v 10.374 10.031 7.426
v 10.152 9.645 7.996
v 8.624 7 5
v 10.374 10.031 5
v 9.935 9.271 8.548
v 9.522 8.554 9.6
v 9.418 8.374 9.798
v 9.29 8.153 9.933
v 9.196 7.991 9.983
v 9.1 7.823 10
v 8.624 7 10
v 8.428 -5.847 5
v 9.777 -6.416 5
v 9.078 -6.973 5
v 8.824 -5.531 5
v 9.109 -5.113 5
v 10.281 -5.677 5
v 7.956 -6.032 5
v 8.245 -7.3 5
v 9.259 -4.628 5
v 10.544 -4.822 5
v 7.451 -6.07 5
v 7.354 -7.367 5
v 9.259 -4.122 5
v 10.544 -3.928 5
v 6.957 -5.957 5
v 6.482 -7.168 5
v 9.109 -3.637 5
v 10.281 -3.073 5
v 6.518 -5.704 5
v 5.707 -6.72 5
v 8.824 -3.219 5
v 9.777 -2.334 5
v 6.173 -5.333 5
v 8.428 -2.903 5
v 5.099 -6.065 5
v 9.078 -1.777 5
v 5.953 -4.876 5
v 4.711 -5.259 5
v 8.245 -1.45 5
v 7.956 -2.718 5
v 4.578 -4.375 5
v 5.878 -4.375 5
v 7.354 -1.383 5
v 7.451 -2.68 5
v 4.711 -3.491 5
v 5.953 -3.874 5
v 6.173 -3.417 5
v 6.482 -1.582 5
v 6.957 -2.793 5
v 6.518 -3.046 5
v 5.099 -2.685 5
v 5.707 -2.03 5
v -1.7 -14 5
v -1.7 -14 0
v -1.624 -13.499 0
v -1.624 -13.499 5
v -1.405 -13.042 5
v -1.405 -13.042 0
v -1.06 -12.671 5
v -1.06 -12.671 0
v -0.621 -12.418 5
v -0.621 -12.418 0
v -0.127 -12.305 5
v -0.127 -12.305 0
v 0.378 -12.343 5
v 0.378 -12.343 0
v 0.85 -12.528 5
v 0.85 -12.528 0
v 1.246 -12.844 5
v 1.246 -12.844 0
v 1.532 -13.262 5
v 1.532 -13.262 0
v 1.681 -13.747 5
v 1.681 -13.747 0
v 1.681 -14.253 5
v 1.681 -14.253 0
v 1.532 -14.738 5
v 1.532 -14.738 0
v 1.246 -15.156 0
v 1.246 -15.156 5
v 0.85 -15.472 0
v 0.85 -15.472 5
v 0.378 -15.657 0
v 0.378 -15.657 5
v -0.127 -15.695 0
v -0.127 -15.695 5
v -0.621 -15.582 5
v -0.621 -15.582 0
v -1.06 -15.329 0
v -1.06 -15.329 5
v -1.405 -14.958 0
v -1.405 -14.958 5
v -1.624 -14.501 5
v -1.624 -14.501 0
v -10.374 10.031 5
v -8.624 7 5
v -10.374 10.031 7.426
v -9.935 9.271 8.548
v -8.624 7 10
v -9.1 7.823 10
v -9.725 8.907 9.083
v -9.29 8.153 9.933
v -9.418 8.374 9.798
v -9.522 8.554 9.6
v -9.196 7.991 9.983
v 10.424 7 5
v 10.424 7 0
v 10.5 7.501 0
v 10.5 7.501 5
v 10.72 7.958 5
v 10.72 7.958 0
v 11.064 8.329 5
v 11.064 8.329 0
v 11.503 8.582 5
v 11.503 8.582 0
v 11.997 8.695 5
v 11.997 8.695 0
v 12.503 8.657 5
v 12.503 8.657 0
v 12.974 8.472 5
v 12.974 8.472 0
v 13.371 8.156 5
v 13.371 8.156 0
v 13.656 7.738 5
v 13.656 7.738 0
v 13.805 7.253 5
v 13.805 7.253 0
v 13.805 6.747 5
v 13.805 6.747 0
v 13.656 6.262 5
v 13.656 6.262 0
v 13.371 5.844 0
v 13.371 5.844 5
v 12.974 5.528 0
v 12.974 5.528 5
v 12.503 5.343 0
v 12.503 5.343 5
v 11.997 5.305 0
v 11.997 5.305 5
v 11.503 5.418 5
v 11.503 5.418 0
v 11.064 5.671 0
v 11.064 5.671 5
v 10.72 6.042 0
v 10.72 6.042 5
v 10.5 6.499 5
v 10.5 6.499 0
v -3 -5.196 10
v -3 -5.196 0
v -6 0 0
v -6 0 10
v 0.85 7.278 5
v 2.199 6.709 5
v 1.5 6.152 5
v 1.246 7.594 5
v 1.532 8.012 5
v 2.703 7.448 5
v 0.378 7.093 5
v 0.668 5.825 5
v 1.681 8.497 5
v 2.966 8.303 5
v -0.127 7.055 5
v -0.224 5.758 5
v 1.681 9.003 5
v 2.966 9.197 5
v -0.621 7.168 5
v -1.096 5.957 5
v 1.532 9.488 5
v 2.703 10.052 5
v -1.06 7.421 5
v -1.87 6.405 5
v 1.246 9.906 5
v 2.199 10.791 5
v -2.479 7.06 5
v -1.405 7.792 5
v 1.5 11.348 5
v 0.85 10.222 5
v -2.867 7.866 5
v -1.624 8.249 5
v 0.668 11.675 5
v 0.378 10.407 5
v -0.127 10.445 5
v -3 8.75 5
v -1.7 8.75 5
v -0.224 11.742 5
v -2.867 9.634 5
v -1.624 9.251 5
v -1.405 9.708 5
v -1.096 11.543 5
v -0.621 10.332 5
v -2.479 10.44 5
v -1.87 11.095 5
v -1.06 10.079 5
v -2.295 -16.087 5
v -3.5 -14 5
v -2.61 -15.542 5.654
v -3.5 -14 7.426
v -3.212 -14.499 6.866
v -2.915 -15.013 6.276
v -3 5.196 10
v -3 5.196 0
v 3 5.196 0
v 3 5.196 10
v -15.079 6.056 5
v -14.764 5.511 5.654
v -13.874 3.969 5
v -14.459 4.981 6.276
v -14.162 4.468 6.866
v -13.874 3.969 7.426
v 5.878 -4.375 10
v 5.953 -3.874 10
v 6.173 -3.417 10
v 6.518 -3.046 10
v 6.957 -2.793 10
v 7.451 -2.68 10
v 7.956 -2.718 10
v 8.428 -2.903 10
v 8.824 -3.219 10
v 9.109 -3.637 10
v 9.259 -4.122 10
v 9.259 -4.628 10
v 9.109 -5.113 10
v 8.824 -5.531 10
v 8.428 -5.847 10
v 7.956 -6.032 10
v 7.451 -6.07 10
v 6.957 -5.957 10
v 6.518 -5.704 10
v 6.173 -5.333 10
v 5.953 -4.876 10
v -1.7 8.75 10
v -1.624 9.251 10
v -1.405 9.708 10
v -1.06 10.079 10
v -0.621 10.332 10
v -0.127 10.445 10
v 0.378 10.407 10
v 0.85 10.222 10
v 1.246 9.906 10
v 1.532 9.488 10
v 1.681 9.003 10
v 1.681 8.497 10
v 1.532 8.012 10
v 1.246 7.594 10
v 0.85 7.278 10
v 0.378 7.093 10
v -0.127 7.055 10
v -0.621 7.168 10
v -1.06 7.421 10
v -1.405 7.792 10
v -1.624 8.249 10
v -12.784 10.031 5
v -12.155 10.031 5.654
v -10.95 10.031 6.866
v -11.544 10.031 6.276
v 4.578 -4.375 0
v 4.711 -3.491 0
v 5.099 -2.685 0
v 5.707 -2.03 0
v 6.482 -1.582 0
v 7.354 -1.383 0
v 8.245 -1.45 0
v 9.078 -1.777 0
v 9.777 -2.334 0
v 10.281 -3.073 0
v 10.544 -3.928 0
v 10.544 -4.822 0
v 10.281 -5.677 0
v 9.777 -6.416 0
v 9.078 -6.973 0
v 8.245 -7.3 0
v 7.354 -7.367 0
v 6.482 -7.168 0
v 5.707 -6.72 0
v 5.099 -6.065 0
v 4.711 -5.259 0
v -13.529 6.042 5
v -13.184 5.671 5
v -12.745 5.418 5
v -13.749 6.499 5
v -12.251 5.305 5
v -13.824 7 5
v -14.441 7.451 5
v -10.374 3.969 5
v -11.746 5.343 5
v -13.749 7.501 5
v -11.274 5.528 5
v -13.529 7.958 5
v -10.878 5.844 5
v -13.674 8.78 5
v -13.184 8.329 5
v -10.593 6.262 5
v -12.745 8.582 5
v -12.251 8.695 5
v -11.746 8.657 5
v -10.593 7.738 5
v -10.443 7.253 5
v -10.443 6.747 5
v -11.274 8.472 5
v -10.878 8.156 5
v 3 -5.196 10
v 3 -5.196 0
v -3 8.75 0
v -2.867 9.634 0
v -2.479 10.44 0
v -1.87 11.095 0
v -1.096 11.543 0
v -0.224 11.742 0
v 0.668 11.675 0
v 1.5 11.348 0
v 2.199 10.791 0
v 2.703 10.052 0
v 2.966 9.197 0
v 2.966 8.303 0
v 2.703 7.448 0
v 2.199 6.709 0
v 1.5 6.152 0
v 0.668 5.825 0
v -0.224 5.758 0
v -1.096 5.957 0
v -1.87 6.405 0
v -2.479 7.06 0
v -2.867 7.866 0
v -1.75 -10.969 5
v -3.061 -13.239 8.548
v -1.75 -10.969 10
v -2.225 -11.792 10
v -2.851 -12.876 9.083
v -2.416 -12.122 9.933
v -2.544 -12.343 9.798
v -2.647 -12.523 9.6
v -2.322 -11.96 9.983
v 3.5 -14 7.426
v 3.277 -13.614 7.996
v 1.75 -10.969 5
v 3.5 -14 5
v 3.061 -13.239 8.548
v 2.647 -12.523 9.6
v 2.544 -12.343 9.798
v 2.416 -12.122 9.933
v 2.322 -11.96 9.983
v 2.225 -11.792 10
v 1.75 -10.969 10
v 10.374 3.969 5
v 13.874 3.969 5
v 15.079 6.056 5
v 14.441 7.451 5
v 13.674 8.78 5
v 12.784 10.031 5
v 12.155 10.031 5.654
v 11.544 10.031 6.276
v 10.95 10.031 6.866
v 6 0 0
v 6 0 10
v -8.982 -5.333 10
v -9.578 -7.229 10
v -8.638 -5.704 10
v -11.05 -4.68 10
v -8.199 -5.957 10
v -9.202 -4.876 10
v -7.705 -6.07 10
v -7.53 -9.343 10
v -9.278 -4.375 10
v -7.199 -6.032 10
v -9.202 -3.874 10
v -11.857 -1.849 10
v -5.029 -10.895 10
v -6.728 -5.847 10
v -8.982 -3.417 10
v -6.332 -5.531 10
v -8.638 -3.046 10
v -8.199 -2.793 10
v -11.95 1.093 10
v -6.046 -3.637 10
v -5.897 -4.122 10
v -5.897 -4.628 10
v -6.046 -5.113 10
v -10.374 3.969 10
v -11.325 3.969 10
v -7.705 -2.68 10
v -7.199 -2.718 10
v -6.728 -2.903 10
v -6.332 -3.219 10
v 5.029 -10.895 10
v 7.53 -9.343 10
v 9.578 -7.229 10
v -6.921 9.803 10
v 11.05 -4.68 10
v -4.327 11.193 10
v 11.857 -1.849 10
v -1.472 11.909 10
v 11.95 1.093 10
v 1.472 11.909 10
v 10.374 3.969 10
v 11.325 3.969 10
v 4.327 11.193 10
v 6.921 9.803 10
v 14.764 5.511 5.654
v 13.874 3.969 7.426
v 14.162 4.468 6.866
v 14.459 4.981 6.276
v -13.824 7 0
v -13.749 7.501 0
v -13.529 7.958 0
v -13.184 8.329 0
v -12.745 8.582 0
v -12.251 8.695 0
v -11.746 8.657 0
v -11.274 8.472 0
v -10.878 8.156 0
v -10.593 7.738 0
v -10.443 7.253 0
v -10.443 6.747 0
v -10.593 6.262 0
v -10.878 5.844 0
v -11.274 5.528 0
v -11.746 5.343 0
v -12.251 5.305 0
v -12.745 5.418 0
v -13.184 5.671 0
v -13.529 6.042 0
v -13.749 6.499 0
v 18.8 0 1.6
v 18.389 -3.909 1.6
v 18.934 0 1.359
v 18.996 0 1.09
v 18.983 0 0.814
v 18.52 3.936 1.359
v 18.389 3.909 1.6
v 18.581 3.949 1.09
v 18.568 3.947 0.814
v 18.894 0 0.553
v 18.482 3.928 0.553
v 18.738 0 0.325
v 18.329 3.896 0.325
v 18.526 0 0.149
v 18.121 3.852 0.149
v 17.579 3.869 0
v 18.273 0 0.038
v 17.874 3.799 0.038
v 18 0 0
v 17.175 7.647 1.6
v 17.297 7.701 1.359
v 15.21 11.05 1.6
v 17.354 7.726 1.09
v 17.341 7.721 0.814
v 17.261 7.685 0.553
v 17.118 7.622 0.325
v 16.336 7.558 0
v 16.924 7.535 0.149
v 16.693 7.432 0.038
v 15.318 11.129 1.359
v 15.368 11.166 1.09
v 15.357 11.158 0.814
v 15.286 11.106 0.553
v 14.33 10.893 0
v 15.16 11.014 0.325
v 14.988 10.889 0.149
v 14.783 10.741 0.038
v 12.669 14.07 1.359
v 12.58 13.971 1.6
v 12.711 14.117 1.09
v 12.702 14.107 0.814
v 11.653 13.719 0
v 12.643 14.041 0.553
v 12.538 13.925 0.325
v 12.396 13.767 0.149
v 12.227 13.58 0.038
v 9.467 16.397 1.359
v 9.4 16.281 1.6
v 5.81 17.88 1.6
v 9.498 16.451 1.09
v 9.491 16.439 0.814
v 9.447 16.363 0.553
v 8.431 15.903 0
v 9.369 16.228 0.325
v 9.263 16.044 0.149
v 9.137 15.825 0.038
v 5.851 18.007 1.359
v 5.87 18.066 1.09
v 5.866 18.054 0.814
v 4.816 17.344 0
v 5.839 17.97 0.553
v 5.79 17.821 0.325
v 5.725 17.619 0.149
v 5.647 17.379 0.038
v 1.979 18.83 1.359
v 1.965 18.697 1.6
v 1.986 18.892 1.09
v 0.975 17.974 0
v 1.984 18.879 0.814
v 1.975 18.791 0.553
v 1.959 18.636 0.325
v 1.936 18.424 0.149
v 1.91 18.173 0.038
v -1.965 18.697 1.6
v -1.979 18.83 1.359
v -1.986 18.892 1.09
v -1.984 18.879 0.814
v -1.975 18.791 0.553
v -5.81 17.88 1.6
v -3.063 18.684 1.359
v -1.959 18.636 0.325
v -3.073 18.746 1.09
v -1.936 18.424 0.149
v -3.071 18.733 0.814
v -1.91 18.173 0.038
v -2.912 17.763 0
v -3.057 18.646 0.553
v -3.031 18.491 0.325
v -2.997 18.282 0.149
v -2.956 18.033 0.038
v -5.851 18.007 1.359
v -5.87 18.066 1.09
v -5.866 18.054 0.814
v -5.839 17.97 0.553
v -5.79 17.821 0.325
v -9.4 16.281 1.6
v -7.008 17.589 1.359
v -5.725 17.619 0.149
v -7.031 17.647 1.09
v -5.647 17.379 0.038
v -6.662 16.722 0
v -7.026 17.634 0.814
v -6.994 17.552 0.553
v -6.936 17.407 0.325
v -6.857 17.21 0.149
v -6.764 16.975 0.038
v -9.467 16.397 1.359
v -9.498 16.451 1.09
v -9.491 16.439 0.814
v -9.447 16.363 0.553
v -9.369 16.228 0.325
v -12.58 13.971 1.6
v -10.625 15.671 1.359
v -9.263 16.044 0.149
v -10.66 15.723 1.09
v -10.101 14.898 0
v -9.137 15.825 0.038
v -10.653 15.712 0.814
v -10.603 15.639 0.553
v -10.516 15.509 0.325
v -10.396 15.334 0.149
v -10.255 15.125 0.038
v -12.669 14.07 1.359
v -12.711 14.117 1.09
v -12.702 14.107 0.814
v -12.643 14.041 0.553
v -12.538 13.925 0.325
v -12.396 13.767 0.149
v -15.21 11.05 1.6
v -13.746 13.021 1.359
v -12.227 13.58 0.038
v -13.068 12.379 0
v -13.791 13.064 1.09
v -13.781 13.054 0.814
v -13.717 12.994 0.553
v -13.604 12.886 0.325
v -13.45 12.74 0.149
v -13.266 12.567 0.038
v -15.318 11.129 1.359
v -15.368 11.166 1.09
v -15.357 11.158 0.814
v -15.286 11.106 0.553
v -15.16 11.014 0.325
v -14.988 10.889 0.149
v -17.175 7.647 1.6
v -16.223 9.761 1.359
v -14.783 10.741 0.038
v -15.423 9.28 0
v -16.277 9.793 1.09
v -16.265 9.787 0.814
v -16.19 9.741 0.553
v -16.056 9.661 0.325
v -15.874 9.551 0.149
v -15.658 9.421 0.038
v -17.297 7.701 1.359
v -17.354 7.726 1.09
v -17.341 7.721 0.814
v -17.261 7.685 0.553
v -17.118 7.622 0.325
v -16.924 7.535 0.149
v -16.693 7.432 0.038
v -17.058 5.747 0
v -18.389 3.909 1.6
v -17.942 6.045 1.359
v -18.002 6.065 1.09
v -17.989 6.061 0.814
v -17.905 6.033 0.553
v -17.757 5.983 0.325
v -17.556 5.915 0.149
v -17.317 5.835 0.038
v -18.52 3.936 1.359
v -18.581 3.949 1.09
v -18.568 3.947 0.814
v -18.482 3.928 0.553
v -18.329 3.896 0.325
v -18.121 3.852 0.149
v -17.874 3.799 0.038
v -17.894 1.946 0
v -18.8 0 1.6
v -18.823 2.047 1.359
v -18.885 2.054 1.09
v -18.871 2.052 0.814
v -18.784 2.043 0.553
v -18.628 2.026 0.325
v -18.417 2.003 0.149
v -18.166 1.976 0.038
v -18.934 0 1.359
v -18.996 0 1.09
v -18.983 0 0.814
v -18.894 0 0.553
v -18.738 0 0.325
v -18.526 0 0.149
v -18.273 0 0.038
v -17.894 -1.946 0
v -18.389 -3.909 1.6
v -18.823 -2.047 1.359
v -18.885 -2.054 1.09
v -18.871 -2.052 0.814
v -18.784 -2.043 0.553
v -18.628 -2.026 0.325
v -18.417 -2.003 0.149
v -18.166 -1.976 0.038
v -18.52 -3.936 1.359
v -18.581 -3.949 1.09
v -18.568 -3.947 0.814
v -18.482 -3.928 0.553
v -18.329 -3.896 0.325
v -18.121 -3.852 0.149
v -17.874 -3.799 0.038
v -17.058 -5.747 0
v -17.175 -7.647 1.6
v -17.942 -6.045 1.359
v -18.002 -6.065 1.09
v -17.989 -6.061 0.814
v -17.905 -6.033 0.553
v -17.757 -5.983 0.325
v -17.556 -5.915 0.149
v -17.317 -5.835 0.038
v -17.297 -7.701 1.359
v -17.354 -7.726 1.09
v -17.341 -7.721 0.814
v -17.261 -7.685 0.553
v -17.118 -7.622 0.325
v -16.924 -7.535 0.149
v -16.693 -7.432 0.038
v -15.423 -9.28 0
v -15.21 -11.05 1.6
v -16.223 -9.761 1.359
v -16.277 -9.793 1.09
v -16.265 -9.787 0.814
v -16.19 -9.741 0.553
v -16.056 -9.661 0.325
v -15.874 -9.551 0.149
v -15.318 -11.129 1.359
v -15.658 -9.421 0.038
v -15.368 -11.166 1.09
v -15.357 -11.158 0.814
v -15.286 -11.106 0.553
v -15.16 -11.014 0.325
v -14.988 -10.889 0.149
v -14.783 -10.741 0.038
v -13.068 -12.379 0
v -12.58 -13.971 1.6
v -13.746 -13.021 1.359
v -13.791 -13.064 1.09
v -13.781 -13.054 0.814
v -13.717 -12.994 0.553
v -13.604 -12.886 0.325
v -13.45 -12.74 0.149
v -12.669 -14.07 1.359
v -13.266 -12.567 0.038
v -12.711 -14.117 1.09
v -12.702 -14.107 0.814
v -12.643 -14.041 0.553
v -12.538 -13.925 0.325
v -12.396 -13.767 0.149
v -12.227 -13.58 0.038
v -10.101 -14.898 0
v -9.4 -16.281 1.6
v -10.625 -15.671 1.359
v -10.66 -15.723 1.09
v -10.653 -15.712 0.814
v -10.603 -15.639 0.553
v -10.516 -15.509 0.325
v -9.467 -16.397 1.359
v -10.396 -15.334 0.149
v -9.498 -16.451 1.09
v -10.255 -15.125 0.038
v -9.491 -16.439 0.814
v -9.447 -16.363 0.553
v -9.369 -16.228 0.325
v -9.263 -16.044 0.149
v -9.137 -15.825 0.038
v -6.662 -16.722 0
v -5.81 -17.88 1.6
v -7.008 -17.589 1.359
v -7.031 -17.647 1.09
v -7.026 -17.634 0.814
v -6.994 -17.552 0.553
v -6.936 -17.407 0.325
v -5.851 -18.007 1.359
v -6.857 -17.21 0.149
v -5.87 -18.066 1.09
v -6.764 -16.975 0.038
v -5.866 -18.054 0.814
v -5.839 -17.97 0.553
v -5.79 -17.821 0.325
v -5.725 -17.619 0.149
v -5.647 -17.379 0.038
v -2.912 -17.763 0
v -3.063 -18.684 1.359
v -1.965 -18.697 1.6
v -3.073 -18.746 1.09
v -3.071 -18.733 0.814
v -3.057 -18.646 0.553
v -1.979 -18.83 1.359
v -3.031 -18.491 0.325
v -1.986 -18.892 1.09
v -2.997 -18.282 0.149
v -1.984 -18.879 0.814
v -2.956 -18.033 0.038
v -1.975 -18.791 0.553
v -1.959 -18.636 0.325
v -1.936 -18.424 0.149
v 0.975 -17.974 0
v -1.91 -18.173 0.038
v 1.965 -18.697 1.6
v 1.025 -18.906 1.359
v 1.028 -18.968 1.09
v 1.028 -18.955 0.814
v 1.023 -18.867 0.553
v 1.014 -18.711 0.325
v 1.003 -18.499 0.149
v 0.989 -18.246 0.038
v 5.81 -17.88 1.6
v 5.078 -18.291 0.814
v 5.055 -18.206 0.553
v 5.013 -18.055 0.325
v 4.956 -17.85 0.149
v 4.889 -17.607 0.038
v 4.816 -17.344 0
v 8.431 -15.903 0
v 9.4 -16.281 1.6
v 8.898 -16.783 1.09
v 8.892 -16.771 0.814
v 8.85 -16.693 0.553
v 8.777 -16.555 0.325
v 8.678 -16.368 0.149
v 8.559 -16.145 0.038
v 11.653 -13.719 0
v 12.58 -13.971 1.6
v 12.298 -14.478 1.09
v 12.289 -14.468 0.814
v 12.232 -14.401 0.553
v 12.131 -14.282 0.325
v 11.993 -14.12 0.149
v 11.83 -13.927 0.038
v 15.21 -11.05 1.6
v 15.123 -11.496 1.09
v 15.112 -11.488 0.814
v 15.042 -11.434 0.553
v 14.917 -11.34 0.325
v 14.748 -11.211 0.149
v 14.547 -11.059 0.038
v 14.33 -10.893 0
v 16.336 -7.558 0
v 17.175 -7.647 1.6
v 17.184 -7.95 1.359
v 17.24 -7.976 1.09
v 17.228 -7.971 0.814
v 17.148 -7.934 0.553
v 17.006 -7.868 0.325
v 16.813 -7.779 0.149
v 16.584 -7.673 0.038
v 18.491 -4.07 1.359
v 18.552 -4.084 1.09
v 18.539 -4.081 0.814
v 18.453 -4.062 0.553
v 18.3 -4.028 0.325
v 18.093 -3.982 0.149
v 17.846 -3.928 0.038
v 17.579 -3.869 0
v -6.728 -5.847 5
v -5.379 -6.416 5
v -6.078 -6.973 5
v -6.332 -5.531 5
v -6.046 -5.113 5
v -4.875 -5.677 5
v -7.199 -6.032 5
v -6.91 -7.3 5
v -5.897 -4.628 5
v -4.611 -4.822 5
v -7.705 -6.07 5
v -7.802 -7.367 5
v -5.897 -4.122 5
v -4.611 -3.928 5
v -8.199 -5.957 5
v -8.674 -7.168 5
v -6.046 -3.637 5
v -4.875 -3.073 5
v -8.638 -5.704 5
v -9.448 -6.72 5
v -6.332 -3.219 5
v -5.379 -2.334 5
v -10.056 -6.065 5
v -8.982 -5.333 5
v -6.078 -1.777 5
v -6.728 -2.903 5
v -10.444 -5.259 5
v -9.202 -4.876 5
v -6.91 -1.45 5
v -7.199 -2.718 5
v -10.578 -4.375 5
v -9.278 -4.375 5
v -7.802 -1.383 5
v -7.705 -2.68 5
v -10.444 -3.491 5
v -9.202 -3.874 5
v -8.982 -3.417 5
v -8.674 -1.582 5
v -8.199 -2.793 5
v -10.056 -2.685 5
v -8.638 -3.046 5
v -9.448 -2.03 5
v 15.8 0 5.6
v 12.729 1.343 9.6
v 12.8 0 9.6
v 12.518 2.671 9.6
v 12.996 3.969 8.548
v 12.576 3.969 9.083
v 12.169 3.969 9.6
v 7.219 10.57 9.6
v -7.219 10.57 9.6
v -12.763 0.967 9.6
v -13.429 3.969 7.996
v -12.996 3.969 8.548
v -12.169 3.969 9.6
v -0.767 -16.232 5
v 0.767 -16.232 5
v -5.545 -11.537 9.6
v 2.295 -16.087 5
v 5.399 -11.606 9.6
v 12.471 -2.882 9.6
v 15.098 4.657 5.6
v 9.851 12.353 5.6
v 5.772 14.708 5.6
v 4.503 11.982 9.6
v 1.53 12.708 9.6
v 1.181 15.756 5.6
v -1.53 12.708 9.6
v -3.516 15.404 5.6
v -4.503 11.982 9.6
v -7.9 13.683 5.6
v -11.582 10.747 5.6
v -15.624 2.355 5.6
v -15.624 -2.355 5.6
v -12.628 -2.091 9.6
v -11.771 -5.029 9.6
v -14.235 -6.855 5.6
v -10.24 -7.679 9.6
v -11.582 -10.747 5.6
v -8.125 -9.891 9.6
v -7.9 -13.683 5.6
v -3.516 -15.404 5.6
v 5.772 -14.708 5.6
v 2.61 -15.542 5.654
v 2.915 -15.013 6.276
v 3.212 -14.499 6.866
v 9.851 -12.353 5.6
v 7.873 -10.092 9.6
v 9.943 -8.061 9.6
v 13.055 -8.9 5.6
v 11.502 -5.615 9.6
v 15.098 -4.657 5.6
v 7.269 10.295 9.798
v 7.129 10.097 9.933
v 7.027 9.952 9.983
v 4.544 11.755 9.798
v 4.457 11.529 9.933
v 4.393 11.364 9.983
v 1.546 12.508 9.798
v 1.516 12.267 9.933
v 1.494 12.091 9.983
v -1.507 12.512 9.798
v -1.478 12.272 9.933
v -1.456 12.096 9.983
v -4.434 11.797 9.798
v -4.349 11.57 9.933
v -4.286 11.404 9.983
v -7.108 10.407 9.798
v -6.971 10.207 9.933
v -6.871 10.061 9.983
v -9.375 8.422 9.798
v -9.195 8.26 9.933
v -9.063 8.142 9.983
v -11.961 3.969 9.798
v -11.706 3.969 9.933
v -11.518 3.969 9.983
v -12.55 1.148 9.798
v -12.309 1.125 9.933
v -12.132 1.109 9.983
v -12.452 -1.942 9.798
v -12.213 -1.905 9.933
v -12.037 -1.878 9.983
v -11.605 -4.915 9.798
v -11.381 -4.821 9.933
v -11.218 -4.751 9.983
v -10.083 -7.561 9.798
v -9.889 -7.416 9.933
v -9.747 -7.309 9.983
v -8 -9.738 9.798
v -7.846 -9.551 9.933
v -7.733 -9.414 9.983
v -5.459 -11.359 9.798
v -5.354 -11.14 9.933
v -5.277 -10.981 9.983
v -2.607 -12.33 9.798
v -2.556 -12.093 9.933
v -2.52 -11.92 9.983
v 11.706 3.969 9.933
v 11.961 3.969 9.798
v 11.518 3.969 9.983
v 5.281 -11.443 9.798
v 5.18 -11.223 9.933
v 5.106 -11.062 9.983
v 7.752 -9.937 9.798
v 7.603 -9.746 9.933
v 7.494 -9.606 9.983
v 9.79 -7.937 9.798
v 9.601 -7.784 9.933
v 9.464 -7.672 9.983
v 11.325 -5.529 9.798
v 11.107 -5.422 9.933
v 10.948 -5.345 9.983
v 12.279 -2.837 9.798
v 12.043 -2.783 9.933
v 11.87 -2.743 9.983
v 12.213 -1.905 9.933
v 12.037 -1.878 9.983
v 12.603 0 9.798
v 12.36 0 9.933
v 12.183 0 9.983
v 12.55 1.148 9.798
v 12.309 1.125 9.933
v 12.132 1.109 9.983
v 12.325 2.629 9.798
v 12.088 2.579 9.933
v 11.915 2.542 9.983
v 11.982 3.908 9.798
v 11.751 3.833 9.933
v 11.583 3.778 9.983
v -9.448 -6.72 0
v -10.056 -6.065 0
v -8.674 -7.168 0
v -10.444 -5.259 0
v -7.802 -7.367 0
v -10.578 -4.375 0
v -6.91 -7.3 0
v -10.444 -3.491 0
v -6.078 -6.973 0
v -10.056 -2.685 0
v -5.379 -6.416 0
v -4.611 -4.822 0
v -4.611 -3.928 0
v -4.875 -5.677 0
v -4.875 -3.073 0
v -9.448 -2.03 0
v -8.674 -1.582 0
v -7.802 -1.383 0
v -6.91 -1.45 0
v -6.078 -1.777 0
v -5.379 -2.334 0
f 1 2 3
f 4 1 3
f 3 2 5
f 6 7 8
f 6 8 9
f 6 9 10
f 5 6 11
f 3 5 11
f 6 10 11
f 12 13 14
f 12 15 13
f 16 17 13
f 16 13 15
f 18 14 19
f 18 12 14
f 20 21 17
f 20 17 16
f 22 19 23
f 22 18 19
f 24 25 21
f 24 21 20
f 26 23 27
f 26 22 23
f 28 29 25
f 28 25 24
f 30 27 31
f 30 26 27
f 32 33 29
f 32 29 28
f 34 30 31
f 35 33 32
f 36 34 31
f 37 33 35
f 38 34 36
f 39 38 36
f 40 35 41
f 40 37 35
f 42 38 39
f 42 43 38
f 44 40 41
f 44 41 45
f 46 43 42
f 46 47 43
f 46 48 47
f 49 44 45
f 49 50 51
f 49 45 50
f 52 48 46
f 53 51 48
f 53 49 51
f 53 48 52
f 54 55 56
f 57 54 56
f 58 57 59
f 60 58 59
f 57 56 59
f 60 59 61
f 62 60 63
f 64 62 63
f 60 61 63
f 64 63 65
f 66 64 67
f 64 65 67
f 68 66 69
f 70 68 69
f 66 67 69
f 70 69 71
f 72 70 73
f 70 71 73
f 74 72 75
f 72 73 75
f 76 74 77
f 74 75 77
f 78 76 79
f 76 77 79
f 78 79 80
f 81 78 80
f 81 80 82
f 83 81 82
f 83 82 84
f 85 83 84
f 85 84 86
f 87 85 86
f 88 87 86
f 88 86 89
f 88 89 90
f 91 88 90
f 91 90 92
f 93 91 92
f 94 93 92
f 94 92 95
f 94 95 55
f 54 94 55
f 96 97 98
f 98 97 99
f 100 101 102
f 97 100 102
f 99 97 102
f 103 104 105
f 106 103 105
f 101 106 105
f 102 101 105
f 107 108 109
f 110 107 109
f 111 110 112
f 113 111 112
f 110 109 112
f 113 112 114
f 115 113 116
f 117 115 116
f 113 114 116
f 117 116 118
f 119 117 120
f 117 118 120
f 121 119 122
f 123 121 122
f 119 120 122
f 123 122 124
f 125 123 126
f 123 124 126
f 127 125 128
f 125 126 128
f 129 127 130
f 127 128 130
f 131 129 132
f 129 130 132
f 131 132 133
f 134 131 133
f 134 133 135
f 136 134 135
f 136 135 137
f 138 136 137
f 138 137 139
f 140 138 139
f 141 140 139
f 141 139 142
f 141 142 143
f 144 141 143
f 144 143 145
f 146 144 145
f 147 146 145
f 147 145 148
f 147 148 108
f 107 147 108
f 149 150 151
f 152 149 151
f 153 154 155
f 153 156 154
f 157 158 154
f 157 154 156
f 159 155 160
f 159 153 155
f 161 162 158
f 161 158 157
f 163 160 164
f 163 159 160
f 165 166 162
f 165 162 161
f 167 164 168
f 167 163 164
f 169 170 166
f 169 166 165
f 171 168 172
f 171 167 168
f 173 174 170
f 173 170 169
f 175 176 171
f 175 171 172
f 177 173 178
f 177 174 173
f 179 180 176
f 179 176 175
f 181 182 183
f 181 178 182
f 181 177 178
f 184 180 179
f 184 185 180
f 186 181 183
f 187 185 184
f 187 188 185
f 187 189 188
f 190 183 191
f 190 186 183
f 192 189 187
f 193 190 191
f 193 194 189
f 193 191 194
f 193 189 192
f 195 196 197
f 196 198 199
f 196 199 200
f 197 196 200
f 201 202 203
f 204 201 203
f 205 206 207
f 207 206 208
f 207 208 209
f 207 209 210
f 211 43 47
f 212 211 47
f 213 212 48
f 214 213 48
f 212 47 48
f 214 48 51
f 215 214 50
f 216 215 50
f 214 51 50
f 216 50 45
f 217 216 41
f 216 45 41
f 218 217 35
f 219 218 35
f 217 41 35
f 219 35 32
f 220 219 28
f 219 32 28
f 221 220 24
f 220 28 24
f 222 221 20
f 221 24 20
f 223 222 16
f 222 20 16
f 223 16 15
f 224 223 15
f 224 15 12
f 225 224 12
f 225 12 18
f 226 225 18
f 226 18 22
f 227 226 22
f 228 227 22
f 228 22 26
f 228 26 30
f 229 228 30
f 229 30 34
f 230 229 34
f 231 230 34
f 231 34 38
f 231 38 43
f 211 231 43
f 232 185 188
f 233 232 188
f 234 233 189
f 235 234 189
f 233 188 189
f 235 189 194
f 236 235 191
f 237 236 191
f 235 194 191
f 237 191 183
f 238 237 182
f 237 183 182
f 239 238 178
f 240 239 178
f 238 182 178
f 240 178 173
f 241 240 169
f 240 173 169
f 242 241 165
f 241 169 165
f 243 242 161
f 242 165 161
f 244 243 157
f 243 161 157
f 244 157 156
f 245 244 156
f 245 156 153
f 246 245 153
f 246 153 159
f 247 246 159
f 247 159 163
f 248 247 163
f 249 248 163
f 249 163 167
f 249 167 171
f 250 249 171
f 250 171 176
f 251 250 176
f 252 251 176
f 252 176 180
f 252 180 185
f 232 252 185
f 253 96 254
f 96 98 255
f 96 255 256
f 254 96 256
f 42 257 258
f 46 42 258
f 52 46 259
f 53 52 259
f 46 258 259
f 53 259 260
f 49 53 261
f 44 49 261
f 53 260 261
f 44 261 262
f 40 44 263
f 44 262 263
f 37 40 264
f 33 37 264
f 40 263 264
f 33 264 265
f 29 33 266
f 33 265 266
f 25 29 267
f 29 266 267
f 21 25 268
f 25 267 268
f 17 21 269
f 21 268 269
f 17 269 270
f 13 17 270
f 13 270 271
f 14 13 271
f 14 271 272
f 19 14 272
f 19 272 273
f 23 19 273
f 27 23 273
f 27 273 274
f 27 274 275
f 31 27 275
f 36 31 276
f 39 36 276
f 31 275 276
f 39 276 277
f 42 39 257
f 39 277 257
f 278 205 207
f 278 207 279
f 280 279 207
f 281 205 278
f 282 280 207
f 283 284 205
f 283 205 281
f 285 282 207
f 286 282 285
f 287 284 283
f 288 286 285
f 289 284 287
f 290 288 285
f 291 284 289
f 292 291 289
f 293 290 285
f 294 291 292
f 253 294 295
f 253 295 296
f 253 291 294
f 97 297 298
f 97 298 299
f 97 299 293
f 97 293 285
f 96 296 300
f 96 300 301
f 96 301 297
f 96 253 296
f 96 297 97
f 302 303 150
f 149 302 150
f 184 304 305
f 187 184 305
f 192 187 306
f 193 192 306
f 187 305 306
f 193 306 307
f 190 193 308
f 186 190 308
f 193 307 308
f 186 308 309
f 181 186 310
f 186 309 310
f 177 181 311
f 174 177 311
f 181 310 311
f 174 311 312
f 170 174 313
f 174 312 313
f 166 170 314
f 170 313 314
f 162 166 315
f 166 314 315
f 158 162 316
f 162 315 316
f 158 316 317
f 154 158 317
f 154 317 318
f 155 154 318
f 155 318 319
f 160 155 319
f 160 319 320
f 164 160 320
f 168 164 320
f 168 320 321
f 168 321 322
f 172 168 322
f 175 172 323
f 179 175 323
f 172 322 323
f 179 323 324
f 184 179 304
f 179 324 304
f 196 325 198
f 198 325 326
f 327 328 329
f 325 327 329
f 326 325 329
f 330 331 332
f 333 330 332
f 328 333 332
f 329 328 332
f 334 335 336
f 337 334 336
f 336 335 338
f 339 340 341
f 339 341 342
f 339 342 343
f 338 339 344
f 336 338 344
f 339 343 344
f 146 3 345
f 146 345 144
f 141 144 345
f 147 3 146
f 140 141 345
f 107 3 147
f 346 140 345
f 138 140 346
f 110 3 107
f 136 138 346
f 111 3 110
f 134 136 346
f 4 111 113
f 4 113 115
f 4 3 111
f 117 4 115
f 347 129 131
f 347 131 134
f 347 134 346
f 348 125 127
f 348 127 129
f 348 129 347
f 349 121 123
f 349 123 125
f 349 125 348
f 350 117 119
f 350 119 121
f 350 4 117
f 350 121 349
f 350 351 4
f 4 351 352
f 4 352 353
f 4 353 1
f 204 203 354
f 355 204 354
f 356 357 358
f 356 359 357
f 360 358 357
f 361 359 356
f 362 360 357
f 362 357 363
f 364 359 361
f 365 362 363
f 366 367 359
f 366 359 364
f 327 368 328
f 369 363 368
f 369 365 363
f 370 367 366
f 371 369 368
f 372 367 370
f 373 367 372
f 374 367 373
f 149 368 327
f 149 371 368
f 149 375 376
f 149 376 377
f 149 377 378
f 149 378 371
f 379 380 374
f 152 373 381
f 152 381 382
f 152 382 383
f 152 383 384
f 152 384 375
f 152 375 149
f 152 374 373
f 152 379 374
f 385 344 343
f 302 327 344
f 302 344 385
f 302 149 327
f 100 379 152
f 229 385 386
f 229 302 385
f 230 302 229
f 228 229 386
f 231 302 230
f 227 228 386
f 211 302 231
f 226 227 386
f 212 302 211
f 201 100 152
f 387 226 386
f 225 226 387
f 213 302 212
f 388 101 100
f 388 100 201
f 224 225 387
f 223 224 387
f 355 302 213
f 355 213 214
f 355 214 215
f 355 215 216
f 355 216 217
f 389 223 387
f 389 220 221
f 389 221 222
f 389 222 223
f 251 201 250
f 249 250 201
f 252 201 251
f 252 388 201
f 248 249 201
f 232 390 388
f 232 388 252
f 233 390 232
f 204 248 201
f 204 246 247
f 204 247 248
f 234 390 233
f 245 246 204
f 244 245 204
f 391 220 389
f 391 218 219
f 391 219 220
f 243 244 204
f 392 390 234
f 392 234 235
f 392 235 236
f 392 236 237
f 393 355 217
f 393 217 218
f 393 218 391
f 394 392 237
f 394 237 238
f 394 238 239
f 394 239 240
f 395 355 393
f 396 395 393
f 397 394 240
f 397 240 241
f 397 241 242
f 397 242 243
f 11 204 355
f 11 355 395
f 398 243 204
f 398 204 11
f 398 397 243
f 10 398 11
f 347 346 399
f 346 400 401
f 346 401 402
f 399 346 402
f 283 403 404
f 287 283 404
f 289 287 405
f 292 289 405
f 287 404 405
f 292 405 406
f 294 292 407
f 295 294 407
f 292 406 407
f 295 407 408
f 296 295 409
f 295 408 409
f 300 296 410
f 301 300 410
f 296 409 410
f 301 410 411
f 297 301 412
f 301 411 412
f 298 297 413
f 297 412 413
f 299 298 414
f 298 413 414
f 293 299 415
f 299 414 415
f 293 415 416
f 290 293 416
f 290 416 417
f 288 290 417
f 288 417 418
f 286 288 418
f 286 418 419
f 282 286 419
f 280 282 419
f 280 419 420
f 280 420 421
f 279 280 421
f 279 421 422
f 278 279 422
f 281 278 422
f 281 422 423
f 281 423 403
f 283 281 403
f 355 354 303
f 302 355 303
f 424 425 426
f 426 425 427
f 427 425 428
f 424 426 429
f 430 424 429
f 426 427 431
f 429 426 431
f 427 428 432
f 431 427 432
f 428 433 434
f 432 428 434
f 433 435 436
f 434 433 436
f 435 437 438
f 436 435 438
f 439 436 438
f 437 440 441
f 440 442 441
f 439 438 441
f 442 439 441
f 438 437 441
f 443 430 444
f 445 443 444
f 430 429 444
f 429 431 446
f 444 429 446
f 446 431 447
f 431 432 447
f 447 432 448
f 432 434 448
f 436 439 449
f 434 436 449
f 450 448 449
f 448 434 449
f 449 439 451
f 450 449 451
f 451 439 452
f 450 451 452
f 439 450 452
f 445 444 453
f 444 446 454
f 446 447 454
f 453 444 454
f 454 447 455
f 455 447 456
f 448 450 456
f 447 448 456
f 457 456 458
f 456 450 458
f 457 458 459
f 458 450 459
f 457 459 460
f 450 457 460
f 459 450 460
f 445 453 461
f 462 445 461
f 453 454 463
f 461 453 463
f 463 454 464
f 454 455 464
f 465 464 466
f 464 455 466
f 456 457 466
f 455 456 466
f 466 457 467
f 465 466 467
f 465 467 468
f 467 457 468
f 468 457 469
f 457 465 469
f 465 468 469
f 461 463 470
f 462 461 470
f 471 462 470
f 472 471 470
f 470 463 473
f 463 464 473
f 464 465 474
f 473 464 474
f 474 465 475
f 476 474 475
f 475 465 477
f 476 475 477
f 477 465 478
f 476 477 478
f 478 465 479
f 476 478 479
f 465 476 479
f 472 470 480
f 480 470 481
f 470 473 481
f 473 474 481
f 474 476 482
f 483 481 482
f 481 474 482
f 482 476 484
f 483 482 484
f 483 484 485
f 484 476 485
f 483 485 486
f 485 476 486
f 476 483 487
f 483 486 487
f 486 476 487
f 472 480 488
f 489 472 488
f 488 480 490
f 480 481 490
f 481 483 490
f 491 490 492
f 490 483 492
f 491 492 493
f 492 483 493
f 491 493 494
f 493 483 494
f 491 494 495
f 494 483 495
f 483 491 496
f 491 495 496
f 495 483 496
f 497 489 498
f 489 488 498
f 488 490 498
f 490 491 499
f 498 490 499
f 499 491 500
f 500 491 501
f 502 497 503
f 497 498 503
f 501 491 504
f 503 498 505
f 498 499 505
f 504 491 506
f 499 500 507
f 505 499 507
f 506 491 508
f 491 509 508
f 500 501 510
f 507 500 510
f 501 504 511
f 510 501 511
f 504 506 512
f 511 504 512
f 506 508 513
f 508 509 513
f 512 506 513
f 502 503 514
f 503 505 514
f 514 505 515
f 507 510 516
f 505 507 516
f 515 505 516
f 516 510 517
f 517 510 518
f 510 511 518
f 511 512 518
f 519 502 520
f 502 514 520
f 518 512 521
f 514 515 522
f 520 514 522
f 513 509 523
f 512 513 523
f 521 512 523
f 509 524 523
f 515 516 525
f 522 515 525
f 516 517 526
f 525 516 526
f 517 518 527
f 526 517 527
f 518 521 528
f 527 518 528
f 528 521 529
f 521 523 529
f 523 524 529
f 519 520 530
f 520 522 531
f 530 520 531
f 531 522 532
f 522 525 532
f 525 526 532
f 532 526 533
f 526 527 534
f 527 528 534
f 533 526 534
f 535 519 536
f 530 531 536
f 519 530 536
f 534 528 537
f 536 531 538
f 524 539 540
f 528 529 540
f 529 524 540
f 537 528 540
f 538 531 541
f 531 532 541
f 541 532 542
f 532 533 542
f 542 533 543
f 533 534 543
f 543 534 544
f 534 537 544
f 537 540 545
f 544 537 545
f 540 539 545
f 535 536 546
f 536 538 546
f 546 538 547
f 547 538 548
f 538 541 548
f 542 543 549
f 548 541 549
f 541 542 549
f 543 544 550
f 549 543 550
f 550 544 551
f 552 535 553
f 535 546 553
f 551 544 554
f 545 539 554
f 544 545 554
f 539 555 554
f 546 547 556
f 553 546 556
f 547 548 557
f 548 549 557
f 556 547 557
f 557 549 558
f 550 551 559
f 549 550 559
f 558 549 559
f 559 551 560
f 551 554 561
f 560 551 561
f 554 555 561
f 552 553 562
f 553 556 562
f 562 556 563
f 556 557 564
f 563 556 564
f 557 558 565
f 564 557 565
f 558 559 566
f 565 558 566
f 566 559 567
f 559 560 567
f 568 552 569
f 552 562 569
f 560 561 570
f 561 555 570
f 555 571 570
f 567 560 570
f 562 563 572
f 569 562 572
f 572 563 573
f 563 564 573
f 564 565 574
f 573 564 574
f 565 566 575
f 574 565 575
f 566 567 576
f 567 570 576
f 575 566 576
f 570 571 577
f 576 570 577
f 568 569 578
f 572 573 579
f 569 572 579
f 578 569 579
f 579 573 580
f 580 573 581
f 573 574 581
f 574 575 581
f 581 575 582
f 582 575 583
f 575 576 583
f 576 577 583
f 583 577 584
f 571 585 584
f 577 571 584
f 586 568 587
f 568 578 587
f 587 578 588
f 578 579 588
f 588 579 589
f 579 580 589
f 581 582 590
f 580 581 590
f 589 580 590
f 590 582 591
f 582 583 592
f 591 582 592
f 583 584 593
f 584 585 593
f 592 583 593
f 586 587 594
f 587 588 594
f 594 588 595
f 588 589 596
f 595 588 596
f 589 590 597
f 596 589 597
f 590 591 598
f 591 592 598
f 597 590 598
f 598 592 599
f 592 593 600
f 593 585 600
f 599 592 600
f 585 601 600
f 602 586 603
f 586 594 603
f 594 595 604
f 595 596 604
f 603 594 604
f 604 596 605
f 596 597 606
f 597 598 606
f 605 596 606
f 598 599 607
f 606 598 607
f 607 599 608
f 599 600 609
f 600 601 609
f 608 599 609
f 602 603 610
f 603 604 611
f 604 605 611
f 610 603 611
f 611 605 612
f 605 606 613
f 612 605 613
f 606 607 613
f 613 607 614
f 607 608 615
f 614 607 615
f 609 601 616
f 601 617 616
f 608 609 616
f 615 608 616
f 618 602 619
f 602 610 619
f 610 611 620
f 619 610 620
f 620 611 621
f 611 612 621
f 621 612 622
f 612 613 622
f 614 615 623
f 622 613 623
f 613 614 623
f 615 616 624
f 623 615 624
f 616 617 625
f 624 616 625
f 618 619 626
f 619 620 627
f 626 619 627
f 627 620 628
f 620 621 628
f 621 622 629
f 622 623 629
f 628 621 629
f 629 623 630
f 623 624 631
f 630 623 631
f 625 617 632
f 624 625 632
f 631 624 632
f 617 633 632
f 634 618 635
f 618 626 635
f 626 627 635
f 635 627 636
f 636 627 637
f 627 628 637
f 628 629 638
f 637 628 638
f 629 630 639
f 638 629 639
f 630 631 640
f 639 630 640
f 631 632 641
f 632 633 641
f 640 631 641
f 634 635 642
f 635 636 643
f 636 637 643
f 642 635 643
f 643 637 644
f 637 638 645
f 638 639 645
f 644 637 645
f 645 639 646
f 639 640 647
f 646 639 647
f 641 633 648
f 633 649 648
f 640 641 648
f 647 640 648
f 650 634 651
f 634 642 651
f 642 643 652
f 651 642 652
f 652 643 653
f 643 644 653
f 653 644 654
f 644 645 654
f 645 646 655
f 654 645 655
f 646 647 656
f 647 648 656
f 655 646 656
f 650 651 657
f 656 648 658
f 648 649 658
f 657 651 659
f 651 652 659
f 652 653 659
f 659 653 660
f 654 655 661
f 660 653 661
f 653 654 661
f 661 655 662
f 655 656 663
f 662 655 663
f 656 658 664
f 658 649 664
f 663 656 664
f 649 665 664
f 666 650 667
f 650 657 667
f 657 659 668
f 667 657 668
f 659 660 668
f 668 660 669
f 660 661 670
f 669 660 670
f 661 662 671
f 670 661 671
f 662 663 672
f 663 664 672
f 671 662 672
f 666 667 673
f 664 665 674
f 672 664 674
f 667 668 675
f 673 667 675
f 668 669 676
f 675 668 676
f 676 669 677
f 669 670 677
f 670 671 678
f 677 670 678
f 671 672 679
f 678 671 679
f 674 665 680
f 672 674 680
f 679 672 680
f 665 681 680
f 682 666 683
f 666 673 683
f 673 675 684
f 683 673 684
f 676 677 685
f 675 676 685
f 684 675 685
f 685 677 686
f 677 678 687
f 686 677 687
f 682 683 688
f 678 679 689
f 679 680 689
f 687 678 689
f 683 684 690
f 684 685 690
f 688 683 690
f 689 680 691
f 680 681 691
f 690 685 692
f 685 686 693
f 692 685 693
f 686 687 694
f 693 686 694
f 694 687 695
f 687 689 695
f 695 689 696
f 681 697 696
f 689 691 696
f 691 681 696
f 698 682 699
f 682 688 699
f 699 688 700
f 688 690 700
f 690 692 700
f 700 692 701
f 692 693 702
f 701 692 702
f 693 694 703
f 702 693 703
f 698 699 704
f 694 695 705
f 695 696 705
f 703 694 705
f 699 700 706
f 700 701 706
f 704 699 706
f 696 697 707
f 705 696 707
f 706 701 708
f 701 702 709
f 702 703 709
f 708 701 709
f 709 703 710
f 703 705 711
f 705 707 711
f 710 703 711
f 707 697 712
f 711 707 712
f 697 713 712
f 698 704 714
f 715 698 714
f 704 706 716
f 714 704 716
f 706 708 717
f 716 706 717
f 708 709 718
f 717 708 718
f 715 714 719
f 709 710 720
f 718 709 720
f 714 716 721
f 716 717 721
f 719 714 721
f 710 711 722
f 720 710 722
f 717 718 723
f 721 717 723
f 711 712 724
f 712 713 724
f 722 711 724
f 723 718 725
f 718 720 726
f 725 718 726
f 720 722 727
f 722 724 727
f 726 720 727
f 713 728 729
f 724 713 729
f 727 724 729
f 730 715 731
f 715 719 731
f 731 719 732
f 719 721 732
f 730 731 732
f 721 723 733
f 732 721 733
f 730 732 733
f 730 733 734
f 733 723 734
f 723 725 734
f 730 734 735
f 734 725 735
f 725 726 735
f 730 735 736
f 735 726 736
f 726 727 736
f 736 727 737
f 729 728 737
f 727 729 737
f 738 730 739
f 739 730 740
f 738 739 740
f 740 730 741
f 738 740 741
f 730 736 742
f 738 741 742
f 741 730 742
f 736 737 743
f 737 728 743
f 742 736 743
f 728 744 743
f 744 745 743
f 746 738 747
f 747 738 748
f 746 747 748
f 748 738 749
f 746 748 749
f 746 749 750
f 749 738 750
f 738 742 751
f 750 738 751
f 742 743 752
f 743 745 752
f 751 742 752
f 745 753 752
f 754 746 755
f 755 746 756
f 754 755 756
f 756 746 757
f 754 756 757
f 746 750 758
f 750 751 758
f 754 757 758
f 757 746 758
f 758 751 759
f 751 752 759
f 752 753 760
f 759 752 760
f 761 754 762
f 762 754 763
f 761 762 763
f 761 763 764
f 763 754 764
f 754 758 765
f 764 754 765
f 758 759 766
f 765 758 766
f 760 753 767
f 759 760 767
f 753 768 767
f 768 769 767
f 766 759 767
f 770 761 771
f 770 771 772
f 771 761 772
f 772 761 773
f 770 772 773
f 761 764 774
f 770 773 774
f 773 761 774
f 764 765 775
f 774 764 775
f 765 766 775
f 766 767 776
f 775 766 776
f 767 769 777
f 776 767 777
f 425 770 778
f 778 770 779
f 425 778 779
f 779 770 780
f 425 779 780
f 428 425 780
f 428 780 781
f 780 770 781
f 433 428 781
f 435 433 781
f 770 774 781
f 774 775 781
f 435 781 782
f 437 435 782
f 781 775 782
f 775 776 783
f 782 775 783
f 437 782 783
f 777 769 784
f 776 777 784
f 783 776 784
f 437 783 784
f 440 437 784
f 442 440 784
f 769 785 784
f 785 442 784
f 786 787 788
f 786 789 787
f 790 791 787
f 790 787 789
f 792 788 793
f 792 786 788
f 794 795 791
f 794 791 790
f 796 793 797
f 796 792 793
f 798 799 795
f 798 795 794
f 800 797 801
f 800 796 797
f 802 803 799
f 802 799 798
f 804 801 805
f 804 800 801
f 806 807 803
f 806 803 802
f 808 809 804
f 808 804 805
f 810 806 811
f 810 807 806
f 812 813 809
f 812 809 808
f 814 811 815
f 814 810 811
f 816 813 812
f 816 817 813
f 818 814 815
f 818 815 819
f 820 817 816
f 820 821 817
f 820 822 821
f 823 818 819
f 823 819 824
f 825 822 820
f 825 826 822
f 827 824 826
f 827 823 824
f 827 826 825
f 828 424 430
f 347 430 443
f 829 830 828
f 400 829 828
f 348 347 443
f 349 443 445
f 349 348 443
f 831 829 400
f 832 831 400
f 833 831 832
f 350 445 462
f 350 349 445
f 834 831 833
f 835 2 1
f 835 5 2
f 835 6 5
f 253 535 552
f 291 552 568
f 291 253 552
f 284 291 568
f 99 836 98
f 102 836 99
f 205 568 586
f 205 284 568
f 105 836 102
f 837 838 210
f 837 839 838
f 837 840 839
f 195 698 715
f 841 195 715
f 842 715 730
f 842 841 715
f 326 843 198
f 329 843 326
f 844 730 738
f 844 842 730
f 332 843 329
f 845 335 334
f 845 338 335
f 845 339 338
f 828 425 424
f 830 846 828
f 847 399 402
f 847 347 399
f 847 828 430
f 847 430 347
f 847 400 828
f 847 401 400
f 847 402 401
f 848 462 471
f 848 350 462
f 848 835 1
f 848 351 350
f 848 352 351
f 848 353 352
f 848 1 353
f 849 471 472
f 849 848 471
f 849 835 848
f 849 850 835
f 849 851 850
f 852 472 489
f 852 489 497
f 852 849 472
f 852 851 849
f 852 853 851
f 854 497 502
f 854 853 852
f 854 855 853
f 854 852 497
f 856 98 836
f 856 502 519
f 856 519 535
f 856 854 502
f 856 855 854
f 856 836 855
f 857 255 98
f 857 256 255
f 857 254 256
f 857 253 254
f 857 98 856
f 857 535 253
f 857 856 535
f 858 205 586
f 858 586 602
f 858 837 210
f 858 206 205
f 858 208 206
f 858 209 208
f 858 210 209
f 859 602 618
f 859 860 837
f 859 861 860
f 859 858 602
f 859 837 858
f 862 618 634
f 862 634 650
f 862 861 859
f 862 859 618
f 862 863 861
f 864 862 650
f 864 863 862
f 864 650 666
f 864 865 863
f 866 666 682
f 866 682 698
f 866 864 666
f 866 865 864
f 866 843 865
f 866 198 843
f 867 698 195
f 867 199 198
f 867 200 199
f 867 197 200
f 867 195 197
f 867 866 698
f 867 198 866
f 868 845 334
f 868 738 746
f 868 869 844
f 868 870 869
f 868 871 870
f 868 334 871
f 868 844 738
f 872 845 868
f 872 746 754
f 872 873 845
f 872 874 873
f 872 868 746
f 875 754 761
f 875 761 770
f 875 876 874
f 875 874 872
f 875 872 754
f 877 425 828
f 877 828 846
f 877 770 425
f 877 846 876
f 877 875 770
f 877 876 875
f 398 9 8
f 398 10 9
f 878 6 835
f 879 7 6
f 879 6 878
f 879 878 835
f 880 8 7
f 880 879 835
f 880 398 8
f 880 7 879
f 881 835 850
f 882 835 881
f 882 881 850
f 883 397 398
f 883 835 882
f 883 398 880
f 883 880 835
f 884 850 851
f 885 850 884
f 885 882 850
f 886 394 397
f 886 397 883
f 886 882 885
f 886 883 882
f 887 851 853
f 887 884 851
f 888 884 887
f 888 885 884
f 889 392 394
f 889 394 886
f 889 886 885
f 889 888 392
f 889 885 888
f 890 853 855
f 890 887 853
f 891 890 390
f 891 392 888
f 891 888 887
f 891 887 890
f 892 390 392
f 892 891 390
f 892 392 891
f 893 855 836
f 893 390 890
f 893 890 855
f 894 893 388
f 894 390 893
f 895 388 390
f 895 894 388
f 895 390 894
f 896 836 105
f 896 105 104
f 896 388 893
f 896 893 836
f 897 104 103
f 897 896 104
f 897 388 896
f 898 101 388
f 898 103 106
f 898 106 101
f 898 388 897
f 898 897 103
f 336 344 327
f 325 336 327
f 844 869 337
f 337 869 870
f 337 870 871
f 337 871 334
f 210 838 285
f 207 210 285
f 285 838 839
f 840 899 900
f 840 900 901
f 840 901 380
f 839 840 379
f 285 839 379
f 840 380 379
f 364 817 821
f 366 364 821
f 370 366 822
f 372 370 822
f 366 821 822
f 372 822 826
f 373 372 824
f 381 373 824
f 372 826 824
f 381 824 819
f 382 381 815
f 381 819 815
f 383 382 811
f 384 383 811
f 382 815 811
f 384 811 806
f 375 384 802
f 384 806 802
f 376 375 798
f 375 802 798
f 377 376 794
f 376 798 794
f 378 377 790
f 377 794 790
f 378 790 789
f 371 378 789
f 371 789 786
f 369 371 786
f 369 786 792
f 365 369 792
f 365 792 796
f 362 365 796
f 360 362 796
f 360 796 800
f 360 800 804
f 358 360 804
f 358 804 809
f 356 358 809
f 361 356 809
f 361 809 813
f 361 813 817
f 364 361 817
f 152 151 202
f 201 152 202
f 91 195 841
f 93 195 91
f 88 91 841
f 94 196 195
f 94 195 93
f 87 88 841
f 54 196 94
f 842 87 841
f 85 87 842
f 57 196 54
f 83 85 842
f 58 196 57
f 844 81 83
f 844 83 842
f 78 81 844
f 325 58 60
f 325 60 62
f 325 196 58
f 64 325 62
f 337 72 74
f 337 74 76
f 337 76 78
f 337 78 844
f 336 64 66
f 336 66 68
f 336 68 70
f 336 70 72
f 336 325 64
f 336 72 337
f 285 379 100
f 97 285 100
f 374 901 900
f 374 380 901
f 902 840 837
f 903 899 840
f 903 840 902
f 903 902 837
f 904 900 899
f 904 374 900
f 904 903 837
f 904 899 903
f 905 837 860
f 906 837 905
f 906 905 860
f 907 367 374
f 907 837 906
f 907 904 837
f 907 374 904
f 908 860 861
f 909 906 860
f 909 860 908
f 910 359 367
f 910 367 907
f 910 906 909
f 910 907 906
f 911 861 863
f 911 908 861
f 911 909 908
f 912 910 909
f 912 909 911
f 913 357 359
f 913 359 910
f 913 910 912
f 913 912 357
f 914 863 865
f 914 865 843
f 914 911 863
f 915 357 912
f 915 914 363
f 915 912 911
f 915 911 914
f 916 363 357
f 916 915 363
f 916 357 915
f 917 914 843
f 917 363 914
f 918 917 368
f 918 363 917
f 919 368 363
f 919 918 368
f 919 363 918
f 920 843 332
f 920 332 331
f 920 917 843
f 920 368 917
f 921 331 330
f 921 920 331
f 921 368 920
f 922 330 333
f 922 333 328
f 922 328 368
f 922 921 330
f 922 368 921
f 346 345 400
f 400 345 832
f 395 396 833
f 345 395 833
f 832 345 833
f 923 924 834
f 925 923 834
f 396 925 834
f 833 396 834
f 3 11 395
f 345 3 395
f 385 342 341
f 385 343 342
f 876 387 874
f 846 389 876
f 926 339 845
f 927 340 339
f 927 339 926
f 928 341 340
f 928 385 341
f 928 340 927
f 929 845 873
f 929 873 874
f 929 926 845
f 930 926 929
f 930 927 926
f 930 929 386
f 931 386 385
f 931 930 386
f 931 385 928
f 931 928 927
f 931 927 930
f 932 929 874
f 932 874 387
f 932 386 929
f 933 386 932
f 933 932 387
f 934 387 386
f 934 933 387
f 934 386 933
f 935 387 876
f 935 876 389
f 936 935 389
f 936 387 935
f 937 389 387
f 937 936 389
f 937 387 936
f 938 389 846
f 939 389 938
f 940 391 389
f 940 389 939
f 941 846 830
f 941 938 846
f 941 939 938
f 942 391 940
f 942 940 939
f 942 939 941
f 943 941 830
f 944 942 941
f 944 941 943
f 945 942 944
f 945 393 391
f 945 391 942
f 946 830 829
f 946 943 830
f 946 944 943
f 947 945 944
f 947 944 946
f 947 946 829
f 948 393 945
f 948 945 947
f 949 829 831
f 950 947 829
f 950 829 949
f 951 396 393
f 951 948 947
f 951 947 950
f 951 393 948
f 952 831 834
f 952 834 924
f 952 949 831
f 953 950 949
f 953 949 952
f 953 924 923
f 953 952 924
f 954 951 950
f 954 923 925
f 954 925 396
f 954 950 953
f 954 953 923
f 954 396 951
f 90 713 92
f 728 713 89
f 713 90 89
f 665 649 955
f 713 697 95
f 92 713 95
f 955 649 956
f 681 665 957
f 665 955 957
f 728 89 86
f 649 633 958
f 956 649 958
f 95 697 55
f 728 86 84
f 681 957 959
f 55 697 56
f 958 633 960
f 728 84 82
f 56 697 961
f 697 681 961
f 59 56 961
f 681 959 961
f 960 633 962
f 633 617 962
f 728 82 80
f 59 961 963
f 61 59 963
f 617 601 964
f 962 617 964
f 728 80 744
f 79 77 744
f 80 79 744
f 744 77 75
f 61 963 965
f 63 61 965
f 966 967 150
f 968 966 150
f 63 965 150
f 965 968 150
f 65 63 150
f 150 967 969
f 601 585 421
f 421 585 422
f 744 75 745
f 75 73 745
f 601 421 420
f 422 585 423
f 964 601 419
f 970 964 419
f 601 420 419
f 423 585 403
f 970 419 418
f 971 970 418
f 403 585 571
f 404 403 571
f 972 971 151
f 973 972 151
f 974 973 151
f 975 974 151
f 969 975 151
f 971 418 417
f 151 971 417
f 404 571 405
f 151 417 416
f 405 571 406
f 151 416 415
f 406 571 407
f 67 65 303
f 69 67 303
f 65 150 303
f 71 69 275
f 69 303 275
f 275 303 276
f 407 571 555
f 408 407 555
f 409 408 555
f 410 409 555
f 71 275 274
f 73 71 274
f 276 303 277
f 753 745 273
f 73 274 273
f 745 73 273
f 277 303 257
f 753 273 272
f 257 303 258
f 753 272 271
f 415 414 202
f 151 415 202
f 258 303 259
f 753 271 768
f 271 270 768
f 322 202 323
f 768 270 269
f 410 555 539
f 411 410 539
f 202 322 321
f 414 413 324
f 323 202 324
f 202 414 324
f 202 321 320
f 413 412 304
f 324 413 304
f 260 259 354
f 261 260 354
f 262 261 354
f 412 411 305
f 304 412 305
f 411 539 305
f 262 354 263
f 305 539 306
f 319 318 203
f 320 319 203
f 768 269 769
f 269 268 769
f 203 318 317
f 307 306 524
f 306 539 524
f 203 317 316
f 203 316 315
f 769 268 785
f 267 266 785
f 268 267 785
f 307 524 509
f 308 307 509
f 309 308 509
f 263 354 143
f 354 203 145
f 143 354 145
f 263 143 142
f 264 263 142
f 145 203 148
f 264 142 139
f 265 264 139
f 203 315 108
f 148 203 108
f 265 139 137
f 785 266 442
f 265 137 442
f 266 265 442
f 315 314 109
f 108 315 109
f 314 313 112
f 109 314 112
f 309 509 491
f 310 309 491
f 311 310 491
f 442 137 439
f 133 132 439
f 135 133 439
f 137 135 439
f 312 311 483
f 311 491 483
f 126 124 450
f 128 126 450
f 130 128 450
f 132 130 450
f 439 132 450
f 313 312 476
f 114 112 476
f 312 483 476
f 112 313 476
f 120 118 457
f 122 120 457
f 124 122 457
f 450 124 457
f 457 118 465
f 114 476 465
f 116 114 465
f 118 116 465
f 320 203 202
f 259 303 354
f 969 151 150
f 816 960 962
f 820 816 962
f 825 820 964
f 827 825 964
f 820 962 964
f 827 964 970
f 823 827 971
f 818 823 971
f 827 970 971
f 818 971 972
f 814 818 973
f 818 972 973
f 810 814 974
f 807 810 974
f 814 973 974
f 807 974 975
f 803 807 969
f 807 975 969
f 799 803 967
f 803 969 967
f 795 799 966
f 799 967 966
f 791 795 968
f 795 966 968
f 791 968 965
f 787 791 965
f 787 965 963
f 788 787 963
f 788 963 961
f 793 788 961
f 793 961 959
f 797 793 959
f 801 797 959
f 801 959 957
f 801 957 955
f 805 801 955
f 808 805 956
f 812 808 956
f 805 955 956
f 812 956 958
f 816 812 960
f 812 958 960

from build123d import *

# Parameters (mm, degrees)
SKETCH_1_R          = 20
SKETCH_2_R          = 12.5
FILLET_1_R          = 1
SKETCH_3_R          = 1.7
CUT_EXTRUDE_1_DEPTH = 29.670542506
CUT_EXTRUDE_2_DEPTH = 29.670542541
SKETCH_6_R          = 3
CUT_EXTRUDE_3_DEPTH = 5
CUT_EXTRUDE_4_DEPTH = 5


with BuildPart() as part:
    # 草图1 → 放样1 section 0
    with BuildSketch(Plane.XY):
        Circle(SKETCH_1_R)
    # 草图2 → 放样1 section 1
    with BuildSketch(Plane.XY.offset(10)):
        Circle(SKETCH_2_R)
    loft()

    # 圆角1
    fillet_1_edges = [part.edges().sort_by_distance(p)[0] for p in [
        (-12.5, 0, 10),
        (-20, 0, 0),
    ]]
    fillet(fillet_1_edges, radius=FILLET_1_R)

    # 草图3 → 切除-拉伸1 (cut, through all)
    with BuildSketch(Plane(origin=(0, 0, 0), x_dir=(-1, 0, 0), z_dir=(0, 0, -1))):
        with Locations((0, -14)):
            Circle(SKETCH_3_R)
        with Locations((-12.124355653, 7)):
            Circle(SKETCH_3_R)
        with Locations((12.124355653, 7)):
            Circle(SKETCH_3_R)
        with Locations((0, 8.75)):
            Circle(SKETCH_3_R)
        with Locations((7.577722283, -4.375)):
            Circle(SKETCH_3_R)
        with Locations((-7.577722283, -4.375)):
            Circle(SKETCH_3_R)
    extrude(amount=-CUT_EXTRUDE_1_DEPTH, mode=Mode.SUBTRACT)

    # 草图5 → 切除-拉伸2 (cut, through all)
    with BuildSketch(Plane(origin=(0, 0, 0), x_dir=(-1, 0, 0), z_dir=(0, 0, -1))):
        Polygon((-3, 5.196152423), (-6, 0), (-3, -5.196152423), (3, -5.196152423), (6, 0), (3, 5.196152423), align=None)
    extrude(amount=-CUT_EXTRUDE_2_DEPTH, mode=Mode.SUBTRACT)

    # 草图6 → 切除-拉伸3 (cut)
    with BuildSketch(Plane(origin=(0, 0, 0), x_dir=(-1, 0, 0), z_dir=(0, 0, -1))):
        with Locations((-7.577722283, -4.375)):
            Circle(SKETCH_6_R)
        with Locations((7.577722283, -4.375)):
            Circle(SKETCH_6_R)
        with Locations((0, 8.75)):
            Circle(SKETCH_6_R)
    extrude(amount=-CUT_EXTRUDE_3_DEPTH, mode=Mode.SUBTRACT)

    # 草图7 → 切除-拉伸4 (cut)
    with BuildSketch(Plane.XY.offset(10)):
        Polygon((-15.624355653, 7), (-13.874355653, 3.968911087), (-10.374355653, 3.968911087), (-8.624355653, 7), (-10.374355653, 10.031088913), (-13.874355653, 10.031088913), align=None)
        Polygon((13.874355653, 3.968911087), (15.624355653, 7), (13.874355653, 10.031088913), (10.374355653, 10.031088913), (8.624355653, 7), (10.374355653, 3.968911087), align=None)
        Polygon((-1.75, -10.968911087), (-3.5, -14), (-1.75, -17.031088913), (1.75, -17.031088913), (3.5, -14), (1.75, -10.968911087), align=None)
    extrude(amount=-CUT_EXTRUDE_4_DEPTH, mode=Mode.SUBTRACT)


solid = part.part
